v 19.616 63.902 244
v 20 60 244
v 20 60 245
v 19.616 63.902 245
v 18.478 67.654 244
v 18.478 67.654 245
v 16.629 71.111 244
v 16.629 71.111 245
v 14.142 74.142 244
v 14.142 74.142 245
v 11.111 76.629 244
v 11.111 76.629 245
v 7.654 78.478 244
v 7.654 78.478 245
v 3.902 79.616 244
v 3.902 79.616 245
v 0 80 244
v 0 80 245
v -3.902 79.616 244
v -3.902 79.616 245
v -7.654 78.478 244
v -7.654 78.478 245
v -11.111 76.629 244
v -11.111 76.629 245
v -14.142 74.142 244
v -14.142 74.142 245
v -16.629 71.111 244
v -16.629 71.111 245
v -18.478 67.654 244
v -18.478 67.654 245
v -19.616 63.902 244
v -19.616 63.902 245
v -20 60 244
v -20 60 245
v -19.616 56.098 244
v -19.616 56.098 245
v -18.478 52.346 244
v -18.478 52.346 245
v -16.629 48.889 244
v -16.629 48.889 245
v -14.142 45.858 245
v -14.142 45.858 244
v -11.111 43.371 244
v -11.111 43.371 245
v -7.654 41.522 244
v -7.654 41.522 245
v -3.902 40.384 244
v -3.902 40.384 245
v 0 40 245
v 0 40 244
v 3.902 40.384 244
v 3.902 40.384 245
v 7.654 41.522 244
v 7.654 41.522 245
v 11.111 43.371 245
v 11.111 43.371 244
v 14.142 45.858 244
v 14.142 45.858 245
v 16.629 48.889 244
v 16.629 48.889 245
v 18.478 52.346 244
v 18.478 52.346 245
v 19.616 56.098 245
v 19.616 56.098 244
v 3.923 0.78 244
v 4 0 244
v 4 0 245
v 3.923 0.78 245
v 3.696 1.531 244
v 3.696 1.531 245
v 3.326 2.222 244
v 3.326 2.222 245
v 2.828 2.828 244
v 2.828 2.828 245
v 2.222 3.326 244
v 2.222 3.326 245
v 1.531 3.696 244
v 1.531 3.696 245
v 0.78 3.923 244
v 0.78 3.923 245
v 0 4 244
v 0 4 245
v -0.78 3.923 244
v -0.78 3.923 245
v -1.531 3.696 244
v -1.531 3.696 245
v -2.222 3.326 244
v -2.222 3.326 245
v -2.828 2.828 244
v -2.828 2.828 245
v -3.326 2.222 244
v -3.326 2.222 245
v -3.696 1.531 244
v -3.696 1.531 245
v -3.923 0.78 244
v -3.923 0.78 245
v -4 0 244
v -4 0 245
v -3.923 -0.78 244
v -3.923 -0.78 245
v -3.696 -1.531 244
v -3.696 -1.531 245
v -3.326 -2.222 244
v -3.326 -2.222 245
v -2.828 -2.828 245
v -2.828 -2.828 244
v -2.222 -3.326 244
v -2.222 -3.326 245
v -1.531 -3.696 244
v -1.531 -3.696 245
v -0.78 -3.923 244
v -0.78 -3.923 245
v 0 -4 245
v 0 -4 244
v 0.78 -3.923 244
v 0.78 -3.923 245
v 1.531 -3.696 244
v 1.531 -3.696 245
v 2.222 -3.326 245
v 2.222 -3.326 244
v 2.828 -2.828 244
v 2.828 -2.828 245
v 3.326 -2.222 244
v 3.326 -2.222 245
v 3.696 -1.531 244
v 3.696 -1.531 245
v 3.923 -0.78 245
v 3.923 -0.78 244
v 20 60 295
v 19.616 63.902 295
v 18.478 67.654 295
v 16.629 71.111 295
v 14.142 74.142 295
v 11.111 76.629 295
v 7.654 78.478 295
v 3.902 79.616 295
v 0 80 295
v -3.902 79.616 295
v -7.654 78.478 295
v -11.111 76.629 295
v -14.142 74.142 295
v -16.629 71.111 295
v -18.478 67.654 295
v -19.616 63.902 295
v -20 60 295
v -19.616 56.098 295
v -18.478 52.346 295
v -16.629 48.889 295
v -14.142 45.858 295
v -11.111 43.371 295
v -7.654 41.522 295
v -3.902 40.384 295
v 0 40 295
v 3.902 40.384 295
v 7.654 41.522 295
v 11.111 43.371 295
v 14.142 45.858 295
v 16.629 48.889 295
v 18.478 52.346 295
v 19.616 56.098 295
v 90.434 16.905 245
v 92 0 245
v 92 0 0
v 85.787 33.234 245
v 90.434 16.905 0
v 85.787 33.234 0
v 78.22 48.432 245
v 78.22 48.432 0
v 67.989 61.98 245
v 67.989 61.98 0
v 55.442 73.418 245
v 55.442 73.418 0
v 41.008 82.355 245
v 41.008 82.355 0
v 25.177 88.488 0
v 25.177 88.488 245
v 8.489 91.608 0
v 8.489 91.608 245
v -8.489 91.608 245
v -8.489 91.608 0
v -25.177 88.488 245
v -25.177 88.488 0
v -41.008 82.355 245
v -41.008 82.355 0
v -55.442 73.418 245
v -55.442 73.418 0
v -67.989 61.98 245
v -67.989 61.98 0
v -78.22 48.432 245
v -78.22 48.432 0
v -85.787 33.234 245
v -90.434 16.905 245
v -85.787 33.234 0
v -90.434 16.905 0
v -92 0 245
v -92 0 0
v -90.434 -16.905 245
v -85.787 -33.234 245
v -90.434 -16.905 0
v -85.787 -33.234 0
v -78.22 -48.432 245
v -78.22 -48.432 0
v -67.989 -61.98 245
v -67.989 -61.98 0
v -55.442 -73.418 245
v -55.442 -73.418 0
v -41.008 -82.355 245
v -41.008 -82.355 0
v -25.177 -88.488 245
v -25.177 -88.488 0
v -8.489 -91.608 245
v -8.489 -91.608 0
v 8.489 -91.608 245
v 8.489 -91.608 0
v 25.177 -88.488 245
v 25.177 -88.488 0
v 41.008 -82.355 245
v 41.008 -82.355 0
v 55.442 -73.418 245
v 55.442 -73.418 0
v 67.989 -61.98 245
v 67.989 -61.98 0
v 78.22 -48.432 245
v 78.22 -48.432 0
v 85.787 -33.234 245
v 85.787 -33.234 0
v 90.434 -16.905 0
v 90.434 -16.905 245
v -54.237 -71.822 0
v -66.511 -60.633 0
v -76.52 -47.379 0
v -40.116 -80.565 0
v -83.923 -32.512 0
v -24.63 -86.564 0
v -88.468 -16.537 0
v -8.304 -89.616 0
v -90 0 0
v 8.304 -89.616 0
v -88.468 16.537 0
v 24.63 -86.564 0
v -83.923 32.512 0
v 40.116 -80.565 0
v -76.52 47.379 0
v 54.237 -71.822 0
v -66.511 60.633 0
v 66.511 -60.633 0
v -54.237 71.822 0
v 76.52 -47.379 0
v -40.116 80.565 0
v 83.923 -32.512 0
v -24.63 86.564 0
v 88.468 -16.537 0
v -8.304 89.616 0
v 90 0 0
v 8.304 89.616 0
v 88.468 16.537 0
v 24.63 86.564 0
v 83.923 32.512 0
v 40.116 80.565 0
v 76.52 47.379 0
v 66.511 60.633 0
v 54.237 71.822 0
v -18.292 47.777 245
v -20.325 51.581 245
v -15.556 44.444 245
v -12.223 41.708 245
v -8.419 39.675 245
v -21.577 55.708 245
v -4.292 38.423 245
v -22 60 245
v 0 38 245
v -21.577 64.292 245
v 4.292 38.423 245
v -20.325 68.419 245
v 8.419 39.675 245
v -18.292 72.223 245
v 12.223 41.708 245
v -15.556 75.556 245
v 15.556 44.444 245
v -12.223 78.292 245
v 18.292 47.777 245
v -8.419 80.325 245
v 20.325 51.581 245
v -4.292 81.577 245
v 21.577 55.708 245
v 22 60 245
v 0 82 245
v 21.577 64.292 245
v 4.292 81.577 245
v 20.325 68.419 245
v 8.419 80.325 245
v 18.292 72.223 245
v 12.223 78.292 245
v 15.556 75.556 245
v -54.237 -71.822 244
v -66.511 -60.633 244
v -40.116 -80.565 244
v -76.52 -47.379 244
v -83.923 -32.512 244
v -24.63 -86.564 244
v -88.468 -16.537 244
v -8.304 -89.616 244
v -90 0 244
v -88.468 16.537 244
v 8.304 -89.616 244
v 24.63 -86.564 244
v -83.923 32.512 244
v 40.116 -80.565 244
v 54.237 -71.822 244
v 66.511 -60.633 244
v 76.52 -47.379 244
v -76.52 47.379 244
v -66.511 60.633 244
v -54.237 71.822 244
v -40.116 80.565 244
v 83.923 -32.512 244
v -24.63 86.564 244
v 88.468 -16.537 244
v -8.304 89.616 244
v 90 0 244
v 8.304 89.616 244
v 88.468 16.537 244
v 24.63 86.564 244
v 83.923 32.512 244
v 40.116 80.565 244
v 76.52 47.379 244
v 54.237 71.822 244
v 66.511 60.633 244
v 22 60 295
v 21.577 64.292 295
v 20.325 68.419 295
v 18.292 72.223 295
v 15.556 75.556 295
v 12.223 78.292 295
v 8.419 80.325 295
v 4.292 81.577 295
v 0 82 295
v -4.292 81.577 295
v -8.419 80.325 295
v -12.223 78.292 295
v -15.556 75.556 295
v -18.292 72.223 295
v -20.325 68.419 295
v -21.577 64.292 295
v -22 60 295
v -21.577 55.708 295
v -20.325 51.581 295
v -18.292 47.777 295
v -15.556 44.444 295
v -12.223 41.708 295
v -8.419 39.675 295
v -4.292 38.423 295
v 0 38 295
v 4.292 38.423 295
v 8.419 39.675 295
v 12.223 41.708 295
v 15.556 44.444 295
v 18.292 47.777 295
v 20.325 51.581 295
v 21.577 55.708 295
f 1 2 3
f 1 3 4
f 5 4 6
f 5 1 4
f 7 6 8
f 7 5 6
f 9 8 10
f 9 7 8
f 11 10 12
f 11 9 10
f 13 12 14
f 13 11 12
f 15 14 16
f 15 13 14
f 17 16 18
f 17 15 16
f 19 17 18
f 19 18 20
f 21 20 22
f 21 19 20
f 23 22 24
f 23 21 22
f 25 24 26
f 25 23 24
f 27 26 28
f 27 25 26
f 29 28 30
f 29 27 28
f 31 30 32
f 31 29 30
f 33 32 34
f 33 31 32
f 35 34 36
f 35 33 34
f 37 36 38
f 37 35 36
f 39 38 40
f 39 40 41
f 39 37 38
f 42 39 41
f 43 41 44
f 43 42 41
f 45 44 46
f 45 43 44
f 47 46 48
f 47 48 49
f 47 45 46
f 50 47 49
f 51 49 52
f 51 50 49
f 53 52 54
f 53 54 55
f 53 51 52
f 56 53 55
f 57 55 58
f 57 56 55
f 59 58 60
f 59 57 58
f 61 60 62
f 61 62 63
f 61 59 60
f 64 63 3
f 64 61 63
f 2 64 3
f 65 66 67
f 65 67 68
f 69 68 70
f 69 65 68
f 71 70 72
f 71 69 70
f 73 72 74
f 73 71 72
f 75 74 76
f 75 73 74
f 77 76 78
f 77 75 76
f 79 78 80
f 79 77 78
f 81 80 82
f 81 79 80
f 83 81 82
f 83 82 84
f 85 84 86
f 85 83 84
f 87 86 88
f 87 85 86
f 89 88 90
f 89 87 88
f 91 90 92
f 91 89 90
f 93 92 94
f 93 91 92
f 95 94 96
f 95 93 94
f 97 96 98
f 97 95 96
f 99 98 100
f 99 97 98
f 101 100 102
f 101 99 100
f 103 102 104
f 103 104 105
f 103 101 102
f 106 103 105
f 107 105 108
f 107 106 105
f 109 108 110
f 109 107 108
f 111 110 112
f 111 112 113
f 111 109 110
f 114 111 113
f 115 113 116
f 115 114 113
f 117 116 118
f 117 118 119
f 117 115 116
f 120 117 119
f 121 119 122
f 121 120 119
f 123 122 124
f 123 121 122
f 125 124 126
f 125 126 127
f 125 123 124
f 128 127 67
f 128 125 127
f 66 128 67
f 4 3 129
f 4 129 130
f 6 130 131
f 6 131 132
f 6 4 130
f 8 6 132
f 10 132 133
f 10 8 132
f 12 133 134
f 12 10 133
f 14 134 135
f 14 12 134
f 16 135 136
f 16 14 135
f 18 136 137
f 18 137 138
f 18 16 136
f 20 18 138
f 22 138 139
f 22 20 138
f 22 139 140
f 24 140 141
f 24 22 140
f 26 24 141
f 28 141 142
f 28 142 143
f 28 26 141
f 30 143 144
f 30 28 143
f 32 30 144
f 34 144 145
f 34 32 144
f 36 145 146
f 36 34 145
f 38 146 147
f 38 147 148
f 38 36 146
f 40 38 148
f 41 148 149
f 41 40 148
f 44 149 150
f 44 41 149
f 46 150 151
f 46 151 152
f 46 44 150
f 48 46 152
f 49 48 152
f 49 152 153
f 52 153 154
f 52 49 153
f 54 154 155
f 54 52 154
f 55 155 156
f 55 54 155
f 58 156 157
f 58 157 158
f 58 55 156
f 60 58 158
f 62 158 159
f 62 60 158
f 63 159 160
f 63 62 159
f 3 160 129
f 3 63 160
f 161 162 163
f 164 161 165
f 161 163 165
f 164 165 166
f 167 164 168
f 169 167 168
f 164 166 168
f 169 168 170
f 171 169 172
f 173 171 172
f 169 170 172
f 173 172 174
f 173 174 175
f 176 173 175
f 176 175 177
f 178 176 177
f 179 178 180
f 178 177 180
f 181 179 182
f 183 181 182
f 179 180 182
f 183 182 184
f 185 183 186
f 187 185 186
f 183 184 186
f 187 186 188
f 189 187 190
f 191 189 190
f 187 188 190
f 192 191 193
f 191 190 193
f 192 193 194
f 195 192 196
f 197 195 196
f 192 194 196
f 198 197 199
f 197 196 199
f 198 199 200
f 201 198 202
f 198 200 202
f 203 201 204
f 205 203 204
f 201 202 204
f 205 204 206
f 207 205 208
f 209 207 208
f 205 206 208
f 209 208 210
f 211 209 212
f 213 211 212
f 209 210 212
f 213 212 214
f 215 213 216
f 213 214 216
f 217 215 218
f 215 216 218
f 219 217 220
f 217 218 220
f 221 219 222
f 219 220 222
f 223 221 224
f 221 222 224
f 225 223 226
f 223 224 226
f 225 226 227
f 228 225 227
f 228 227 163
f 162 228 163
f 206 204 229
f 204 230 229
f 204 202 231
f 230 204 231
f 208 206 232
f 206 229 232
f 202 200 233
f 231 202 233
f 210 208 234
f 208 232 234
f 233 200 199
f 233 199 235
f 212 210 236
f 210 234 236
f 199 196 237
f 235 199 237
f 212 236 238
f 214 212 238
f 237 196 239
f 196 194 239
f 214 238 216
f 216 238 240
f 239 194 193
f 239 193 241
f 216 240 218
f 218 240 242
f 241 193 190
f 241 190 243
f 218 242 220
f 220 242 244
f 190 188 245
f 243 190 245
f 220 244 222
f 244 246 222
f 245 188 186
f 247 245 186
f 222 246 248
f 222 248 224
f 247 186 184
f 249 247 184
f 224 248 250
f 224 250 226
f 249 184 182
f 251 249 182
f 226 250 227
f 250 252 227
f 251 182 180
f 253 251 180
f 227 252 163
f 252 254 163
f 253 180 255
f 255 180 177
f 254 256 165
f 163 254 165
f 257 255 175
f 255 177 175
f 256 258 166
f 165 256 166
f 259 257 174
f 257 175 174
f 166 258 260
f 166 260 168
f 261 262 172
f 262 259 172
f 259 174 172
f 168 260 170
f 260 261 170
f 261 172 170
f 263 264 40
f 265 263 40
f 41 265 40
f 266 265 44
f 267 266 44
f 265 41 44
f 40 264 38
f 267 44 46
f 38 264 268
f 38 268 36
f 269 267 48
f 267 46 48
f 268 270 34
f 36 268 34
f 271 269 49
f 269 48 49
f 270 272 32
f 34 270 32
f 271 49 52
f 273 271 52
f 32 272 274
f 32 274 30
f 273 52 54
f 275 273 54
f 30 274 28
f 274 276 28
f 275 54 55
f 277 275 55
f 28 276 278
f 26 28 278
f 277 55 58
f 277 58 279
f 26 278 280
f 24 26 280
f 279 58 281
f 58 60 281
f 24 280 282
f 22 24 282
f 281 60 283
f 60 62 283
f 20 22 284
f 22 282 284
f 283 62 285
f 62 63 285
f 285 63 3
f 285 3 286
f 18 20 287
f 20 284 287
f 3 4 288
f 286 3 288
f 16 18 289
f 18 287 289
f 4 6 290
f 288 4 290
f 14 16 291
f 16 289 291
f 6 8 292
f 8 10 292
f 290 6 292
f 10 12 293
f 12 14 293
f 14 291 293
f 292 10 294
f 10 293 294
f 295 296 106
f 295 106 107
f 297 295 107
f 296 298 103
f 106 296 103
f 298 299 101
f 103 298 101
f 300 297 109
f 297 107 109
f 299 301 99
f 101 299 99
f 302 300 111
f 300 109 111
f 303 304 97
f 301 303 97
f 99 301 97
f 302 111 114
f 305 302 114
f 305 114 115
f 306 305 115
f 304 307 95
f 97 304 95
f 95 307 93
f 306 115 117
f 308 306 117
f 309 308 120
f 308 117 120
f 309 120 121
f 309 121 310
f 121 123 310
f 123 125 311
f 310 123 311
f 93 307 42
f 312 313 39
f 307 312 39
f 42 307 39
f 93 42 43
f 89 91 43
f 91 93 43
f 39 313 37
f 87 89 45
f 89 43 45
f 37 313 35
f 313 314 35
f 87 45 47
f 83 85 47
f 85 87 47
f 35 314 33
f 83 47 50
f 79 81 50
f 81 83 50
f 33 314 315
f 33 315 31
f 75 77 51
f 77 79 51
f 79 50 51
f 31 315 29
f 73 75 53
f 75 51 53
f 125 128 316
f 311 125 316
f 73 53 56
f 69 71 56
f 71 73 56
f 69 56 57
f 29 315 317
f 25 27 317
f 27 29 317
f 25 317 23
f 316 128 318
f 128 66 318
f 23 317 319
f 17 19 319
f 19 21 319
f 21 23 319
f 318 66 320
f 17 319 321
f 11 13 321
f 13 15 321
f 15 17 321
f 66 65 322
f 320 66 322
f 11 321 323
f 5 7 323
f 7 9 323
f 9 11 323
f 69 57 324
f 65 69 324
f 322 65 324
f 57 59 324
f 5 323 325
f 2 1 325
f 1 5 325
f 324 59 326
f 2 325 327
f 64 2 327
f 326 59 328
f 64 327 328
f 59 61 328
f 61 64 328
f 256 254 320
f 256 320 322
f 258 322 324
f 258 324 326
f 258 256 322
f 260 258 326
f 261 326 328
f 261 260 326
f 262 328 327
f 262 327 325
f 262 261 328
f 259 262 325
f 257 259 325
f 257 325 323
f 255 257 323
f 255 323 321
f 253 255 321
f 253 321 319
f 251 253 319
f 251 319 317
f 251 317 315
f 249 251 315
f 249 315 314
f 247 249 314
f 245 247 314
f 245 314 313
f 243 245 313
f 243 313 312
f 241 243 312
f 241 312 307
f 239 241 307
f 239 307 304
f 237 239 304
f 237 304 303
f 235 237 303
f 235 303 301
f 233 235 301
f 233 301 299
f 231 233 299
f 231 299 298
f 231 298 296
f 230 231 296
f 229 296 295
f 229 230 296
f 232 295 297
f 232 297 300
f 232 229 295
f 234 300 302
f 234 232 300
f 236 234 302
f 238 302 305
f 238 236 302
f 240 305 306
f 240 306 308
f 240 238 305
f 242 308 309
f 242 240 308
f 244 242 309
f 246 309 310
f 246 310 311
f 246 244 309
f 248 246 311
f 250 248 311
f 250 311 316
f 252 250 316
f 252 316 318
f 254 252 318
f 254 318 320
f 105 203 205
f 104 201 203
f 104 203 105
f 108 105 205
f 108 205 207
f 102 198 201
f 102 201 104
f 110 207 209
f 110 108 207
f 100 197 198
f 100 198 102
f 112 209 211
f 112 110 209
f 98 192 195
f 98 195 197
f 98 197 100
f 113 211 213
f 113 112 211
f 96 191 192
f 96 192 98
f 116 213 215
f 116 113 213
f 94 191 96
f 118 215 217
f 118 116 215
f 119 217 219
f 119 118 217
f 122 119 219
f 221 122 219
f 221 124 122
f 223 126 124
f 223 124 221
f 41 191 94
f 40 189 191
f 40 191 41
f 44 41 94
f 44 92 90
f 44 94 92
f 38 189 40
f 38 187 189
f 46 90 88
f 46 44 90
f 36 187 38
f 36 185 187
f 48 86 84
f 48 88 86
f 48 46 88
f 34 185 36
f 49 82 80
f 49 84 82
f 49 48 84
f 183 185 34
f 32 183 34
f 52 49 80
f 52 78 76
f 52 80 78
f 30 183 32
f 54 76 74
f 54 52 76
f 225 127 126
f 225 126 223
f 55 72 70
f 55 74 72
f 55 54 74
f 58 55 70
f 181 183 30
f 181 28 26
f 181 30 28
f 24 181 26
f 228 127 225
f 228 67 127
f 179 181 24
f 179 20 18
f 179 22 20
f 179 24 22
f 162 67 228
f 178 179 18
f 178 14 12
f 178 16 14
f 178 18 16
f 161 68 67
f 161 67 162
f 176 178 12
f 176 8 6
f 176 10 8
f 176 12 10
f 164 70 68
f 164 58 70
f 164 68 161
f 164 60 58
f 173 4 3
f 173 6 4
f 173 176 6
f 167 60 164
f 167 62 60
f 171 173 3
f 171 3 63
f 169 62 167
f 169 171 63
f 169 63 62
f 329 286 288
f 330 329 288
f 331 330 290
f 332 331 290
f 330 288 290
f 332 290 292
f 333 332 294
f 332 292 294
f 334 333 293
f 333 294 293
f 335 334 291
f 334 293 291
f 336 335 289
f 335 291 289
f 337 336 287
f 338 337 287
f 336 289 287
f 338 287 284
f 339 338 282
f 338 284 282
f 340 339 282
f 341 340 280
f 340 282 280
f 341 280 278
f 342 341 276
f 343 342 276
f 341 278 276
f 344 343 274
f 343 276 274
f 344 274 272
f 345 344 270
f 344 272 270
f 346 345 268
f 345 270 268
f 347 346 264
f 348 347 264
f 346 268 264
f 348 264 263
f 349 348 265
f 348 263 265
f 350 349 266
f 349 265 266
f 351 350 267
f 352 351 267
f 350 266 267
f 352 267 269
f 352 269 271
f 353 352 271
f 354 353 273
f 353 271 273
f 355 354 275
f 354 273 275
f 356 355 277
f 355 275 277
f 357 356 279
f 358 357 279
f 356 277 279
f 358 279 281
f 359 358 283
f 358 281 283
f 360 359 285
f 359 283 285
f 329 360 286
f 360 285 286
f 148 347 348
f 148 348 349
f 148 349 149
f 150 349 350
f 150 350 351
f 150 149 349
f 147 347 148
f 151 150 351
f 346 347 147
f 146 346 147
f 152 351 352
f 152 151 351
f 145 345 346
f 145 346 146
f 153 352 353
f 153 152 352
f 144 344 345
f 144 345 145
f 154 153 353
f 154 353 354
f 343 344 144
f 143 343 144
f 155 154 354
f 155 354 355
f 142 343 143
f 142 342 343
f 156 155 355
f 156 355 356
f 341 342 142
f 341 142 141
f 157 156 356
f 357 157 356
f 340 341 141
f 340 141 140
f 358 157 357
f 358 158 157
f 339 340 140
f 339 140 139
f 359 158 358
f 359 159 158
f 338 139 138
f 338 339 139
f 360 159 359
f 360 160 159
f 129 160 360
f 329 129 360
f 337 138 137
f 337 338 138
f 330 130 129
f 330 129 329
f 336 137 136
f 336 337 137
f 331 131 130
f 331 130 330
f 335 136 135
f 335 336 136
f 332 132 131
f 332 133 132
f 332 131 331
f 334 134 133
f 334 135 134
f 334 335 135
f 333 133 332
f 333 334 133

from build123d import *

# Parameters (mm, degrees)
SKETCH1_R           = 92
SKETCH1_R_2         = 90
BOSS_EXTRUDE1_DEPTH = 245
BOSS_EXTRUDE2_START = -1
SKETCH2_R           = 90
SKETCH2_R_2         = 4
SKETCH2_R_3         = 20
BOSS_EXTRUDE2_DEPTH = 1
SKETCH3_R           = 22
SKETCH3_R_2         = 20
BOSS_EXTRUDE3_DEPTH = 50


with BuildPart() as part:
    # Sketch1 → Boss-Extrude1 (new body)
    with BuildSketch(Plane.XY):
        Circle(SKETCH1_R)
        Circle(SKETCH1_R_2, mode=Mode.SUBTRACT)
    extrude(amount=BOSS_EXTRUDE1_DEPTH)

    # Sketch2 → Boss-Extrude2 (add)
    with BuildSketch(Plane.XY.offset(245).offset(BOSS_EXTRUDE2_START)):
        Circle(SKETCH2_R)
        Circle(SKETCH2_R_2, mode=Mode.SUBTRACT)
        with Locations((0, 60)):
            Circle(SKETCH2_R_3, mode=Mode.SUBTRACT)
    extrude(amount=BOSS_EXTRUDE2_DEPTH)


with BuildPart() as body_2:
    # Sketch3 → Boss-Extrude3 (new body)
    with BuildSketch(Plane.XY.offset(245)):
        with Locations((0, 60)):
            Circle(SKETCH3_R)
        with Locations((0, 60)):
            Circle(SKETCH3_R_2, mode=Mode.SUBTRACT)
    extrude(amount=BOSS_EXTRUDE3_DEPTH)


solid = Compound([part.part, body_2.part])
